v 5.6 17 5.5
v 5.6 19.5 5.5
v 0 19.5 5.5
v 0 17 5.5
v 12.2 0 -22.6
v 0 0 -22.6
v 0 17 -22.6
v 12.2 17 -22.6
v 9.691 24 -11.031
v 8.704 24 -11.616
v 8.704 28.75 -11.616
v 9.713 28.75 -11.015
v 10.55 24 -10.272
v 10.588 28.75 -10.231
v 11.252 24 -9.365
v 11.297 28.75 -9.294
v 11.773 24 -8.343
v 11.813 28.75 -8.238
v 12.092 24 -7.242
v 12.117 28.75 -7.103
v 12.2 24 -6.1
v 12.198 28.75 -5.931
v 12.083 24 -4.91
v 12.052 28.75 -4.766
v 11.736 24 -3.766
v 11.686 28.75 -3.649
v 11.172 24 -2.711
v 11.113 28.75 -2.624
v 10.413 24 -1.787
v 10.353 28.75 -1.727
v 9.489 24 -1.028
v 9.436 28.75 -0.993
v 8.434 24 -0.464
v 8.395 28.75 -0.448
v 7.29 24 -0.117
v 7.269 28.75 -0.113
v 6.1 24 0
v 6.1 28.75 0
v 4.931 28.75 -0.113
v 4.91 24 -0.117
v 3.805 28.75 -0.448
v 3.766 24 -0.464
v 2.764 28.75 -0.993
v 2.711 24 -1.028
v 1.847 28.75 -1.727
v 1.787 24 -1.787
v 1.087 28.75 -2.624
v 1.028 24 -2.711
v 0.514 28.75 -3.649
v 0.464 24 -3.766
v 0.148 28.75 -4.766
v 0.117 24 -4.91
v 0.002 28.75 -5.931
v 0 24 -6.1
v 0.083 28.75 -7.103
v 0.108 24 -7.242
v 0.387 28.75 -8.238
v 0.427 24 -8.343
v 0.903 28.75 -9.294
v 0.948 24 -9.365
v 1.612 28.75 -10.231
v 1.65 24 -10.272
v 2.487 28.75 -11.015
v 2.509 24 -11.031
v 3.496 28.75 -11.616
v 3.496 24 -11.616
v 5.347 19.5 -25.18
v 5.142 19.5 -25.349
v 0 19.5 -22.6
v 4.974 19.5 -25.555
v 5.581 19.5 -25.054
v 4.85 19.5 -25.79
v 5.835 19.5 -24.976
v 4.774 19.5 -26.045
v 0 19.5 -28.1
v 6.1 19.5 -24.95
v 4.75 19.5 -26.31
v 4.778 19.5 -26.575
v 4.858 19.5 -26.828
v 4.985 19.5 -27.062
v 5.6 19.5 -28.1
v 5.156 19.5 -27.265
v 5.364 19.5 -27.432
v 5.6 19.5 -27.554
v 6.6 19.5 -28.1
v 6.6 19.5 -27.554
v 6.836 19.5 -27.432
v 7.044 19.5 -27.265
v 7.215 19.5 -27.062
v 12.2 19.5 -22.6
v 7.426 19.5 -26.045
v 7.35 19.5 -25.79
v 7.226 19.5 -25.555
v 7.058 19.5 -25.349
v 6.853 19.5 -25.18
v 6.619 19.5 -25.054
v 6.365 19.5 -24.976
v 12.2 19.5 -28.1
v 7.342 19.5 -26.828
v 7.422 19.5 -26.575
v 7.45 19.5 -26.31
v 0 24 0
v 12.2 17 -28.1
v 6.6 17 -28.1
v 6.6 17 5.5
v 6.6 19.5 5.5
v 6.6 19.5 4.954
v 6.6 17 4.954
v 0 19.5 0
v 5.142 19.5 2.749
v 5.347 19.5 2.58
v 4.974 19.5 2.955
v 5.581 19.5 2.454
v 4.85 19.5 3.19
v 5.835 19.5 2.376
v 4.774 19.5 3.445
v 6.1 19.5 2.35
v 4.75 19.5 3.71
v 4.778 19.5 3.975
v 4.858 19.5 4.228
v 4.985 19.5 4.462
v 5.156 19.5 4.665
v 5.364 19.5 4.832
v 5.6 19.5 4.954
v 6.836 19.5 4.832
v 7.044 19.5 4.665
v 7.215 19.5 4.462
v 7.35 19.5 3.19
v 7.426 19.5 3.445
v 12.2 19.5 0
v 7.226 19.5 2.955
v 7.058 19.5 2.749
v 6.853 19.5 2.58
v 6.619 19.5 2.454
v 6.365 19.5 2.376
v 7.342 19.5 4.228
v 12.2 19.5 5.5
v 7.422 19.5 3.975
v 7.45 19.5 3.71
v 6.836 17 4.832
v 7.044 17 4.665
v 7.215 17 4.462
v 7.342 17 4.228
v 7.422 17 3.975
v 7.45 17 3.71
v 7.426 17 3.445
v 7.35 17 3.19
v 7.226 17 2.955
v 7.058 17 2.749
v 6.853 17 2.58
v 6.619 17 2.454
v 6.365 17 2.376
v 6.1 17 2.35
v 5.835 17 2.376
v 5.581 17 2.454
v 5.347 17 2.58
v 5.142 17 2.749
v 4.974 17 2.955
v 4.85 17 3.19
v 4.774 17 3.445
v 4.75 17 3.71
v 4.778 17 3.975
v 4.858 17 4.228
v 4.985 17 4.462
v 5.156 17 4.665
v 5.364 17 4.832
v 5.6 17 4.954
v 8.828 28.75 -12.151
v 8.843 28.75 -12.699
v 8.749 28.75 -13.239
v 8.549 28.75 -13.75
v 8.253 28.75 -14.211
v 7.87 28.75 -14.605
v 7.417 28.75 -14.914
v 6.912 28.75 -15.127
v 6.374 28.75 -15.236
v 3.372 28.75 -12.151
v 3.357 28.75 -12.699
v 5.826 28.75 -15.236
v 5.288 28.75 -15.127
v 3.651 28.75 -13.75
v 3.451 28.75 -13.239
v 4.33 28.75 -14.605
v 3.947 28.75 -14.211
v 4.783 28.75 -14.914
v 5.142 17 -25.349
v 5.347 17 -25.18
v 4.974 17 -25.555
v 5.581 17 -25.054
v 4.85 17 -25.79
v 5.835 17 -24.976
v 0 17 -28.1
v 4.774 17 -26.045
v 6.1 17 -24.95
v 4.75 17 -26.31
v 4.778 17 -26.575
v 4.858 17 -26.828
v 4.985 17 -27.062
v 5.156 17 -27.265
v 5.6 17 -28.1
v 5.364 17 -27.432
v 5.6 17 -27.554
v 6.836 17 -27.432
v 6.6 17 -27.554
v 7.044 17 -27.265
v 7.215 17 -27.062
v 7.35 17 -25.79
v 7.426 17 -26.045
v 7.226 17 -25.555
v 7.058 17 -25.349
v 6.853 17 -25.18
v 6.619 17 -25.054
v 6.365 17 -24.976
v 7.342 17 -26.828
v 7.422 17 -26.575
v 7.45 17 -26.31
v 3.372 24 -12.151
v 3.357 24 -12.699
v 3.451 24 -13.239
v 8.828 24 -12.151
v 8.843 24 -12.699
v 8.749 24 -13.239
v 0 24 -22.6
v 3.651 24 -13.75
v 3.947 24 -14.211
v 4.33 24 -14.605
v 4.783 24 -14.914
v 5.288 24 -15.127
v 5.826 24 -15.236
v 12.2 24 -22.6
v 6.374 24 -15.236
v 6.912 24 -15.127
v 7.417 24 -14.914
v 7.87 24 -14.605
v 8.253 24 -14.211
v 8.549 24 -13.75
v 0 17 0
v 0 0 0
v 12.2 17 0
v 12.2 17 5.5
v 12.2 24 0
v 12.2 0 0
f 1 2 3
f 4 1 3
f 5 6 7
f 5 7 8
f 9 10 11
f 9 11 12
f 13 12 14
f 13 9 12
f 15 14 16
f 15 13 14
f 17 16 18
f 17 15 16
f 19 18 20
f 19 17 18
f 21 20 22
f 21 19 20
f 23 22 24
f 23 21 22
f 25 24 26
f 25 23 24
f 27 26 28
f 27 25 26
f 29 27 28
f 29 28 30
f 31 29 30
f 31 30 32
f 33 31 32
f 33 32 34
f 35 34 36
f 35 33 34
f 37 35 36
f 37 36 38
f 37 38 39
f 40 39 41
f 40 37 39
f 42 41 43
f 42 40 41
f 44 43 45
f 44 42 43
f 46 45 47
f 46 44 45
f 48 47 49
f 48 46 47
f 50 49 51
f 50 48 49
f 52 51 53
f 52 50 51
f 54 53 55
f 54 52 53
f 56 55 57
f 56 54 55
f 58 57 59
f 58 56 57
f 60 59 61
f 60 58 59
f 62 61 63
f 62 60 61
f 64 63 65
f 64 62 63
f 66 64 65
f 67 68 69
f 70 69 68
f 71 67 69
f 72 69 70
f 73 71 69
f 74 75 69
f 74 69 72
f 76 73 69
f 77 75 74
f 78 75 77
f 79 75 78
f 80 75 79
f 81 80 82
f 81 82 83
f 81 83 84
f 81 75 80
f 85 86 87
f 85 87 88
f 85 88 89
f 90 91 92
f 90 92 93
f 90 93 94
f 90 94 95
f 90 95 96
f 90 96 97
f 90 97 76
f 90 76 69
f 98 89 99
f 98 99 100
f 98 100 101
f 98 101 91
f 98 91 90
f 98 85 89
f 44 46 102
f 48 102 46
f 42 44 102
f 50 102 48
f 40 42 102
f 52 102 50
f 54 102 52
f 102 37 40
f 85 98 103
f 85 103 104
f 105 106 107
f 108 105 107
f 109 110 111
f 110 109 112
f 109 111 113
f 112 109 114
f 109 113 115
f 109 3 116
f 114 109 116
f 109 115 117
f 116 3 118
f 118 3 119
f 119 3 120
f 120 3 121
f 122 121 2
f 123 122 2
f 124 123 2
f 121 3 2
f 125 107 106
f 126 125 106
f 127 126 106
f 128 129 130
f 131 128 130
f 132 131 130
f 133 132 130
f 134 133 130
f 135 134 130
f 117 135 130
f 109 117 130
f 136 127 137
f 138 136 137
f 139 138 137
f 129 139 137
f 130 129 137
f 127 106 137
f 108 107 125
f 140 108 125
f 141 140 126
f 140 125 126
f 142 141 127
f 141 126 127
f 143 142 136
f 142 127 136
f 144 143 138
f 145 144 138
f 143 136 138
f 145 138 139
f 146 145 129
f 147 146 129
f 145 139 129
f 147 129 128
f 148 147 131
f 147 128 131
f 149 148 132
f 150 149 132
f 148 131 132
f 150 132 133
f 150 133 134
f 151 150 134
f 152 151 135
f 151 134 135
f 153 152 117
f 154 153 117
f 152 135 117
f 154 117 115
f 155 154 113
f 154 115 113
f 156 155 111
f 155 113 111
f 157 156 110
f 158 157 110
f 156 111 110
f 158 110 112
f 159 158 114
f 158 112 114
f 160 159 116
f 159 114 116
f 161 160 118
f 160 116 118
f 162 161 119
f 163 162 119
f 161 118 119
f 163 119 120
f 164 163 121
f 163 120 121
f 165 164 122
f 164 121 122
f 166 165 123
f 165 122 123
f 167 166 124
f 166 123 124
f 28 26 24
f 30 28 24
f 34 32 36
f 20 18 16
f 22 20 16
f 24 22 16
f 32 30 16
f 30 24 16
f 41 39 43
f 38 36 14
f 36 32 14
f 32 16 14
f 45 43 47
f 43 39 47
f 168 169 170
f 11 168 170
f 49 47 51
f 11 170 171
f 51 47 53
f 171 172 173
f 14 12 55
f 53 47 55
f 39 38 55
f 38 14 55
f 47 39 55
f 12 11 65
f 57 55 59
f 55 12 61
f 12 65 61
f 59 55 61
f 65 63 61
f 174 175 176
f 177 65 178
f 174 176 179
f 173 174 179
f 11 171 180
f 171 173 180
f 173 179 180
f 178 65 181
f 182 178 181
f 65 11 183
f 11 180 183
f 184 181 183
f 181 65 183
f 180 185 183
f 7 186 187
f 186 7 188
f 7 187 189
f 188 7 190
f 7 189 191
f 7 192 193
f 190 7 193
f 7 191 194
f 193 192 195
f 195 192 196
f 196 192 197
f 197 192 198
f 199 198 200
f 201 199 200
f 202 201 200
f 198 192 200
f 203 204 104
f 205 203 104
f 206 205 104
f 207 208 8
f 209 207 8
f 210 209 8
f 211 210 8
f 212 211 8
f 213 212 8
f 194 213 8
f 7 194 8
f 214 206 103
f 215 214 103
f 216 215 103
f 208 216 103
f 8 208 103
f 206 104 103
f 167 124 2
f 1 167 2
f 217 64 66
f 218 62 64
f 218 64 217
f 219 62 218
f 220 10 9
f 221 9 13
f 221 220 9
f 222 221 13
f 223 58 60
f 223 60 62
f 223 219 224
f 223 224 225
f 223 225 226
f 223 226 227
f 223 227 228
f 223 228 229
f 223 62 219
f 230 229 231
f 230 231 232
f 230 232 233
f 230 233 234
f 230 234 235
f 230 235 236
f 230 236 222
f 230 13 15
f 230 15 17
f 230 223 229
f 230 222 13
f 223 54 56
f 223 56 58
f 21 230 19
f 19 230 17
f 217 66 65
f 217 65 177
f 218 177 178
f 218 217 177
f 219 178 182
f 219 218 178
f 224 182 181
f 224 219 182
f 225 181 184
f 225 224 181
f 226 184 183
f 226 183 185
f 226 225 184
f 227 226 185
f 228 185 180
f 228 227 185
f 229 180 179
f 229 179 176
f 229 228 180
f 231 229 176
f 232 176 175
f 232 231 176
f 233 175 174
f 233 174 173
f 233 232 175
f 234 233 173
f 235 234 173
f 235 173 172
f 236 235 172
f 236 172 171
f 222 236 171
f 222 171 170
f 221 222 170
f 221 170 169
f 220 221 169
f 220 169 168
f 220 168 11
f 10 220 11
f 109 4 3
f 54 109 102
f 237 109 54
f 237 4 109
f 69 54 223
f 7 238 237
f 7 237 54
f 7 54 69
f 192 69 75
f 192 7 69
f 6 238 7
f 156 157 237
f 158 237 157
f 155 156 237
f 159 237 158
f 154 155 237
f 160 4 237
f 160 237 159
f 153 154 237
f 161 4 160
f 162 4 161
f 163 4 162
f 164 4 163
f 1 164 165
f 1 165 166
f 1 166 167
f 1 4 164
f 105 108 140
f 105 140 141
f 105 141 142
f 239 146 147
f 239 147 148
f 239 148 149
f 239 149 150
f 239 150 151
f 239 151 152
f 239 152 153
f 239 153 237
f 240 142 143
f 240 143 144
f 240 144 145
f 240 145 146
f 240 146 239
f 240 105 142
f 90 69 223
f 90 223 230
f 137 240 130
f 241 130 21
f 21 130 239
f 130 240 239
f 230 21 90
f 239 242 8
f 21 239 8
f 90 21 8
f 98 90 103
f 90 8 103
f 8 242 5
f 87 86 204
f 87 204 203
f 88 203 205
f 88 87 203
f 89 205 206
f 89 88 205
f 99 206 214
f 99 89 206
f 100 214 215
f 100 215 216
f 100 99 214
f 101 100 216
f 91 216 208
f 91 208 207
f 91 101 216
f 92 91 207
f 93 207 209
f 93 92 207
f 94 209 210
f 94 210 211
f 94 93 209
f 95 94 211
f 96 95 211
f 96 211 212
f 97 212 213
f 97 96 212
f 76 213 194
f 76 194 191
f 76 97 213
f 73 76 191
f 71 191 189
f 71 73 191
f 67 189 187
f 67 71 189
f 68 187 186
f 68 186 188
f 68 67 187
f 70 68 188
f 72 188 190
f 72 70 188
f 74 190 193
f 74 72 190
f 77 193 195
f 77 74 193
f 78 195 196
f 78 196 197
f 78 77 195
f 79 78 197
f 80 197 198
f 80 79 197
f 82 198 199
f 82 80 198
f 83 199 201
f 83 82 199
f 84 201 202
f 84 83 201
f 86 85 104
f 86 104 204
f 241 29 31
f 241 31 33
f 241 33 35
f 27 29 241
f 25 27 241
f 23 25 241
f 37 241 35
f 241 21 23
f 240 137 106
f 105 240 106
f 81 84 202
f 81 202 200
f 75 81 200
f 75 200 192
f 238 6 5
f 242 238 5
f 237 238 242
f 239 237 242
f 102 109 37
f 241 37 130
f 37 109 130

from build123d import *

# Parameters (mm, degrees)
SKETCH1_W           = 12.2
SKETCH1_H           = 22.6
BOSS_EXTRUDE1_DEPTH = 24
BOSS_EXTRUDE2_DEPTH = 2.5
BOSS_EXTRUDE3_DEPTH = 4.75


with BuildPart() as part:
    # Sketch1 → Boss-Extrude1 (new body)
    with BuildSketch(Plane(origin=(0, 0, 0), x_dir=(1, 0, 0), z_dir=(0, 1, 0))):
        with Locations((6.1, 11.3)):
            Rectangle(SKETCH1_W, SKETCH1_H)
    extrude(amount=BOSS_EXTRUDE1_DEPTH)

    # Sketch2 → Boss-Extrude2 (add)
    with BuildSketch(Plane(origin=(0, 19.5, 0), x_dir=(1, 0, 0), z_dir=(0, 1, 0))):
        with BuildLine():
            Line((0, 22.6), (12.2, 22.6))
            Line((12.2, 22.6), (12.2, 28.1))
            Line((12.2, 28.1), (6.6, 28.1))
            Line((6.6, 28.1), (6.6, 27.55399362))
            ThreePointArc((6.6, 27.55399362), (6.1, 24.95), (5.6, 27.55399362))
            Line((5.6, 27.55399362), (5.6, 28.1))
            Line((5.6, 28.1), (0, 28.1))
            Line((0, 28.1), (0, 22.6))
        make_face()
    boss_extrude2 = extrude(amount=-BOSS_EXTRUDE2_DEPTH)

    # Mirror1: Boss-Extrude2 across plane
    add(boss_extrude2.mirror(Plane.XY.offset(-11.3)))

    # Sketch6 → Boss-Extrude3 (add)
    with BuildSketch(Plane(origin=(0, 24, 0), x_dir=(1, 0, 0), z_dir=(0, 1, 0))):
        with BuildLine():
            ThreePointArc((8.704115376, 11.616210937), (6.1, 0), (3.495884624, 11.616210937))
            ThreePointArc((3.495884624, 11.616210937), (6.1, 15.25), (8.704115376, 11.616210937))
        make_face()
    extrude(amount=BOSS_EXTRUDE3_DEPTH)


solid = part.part
